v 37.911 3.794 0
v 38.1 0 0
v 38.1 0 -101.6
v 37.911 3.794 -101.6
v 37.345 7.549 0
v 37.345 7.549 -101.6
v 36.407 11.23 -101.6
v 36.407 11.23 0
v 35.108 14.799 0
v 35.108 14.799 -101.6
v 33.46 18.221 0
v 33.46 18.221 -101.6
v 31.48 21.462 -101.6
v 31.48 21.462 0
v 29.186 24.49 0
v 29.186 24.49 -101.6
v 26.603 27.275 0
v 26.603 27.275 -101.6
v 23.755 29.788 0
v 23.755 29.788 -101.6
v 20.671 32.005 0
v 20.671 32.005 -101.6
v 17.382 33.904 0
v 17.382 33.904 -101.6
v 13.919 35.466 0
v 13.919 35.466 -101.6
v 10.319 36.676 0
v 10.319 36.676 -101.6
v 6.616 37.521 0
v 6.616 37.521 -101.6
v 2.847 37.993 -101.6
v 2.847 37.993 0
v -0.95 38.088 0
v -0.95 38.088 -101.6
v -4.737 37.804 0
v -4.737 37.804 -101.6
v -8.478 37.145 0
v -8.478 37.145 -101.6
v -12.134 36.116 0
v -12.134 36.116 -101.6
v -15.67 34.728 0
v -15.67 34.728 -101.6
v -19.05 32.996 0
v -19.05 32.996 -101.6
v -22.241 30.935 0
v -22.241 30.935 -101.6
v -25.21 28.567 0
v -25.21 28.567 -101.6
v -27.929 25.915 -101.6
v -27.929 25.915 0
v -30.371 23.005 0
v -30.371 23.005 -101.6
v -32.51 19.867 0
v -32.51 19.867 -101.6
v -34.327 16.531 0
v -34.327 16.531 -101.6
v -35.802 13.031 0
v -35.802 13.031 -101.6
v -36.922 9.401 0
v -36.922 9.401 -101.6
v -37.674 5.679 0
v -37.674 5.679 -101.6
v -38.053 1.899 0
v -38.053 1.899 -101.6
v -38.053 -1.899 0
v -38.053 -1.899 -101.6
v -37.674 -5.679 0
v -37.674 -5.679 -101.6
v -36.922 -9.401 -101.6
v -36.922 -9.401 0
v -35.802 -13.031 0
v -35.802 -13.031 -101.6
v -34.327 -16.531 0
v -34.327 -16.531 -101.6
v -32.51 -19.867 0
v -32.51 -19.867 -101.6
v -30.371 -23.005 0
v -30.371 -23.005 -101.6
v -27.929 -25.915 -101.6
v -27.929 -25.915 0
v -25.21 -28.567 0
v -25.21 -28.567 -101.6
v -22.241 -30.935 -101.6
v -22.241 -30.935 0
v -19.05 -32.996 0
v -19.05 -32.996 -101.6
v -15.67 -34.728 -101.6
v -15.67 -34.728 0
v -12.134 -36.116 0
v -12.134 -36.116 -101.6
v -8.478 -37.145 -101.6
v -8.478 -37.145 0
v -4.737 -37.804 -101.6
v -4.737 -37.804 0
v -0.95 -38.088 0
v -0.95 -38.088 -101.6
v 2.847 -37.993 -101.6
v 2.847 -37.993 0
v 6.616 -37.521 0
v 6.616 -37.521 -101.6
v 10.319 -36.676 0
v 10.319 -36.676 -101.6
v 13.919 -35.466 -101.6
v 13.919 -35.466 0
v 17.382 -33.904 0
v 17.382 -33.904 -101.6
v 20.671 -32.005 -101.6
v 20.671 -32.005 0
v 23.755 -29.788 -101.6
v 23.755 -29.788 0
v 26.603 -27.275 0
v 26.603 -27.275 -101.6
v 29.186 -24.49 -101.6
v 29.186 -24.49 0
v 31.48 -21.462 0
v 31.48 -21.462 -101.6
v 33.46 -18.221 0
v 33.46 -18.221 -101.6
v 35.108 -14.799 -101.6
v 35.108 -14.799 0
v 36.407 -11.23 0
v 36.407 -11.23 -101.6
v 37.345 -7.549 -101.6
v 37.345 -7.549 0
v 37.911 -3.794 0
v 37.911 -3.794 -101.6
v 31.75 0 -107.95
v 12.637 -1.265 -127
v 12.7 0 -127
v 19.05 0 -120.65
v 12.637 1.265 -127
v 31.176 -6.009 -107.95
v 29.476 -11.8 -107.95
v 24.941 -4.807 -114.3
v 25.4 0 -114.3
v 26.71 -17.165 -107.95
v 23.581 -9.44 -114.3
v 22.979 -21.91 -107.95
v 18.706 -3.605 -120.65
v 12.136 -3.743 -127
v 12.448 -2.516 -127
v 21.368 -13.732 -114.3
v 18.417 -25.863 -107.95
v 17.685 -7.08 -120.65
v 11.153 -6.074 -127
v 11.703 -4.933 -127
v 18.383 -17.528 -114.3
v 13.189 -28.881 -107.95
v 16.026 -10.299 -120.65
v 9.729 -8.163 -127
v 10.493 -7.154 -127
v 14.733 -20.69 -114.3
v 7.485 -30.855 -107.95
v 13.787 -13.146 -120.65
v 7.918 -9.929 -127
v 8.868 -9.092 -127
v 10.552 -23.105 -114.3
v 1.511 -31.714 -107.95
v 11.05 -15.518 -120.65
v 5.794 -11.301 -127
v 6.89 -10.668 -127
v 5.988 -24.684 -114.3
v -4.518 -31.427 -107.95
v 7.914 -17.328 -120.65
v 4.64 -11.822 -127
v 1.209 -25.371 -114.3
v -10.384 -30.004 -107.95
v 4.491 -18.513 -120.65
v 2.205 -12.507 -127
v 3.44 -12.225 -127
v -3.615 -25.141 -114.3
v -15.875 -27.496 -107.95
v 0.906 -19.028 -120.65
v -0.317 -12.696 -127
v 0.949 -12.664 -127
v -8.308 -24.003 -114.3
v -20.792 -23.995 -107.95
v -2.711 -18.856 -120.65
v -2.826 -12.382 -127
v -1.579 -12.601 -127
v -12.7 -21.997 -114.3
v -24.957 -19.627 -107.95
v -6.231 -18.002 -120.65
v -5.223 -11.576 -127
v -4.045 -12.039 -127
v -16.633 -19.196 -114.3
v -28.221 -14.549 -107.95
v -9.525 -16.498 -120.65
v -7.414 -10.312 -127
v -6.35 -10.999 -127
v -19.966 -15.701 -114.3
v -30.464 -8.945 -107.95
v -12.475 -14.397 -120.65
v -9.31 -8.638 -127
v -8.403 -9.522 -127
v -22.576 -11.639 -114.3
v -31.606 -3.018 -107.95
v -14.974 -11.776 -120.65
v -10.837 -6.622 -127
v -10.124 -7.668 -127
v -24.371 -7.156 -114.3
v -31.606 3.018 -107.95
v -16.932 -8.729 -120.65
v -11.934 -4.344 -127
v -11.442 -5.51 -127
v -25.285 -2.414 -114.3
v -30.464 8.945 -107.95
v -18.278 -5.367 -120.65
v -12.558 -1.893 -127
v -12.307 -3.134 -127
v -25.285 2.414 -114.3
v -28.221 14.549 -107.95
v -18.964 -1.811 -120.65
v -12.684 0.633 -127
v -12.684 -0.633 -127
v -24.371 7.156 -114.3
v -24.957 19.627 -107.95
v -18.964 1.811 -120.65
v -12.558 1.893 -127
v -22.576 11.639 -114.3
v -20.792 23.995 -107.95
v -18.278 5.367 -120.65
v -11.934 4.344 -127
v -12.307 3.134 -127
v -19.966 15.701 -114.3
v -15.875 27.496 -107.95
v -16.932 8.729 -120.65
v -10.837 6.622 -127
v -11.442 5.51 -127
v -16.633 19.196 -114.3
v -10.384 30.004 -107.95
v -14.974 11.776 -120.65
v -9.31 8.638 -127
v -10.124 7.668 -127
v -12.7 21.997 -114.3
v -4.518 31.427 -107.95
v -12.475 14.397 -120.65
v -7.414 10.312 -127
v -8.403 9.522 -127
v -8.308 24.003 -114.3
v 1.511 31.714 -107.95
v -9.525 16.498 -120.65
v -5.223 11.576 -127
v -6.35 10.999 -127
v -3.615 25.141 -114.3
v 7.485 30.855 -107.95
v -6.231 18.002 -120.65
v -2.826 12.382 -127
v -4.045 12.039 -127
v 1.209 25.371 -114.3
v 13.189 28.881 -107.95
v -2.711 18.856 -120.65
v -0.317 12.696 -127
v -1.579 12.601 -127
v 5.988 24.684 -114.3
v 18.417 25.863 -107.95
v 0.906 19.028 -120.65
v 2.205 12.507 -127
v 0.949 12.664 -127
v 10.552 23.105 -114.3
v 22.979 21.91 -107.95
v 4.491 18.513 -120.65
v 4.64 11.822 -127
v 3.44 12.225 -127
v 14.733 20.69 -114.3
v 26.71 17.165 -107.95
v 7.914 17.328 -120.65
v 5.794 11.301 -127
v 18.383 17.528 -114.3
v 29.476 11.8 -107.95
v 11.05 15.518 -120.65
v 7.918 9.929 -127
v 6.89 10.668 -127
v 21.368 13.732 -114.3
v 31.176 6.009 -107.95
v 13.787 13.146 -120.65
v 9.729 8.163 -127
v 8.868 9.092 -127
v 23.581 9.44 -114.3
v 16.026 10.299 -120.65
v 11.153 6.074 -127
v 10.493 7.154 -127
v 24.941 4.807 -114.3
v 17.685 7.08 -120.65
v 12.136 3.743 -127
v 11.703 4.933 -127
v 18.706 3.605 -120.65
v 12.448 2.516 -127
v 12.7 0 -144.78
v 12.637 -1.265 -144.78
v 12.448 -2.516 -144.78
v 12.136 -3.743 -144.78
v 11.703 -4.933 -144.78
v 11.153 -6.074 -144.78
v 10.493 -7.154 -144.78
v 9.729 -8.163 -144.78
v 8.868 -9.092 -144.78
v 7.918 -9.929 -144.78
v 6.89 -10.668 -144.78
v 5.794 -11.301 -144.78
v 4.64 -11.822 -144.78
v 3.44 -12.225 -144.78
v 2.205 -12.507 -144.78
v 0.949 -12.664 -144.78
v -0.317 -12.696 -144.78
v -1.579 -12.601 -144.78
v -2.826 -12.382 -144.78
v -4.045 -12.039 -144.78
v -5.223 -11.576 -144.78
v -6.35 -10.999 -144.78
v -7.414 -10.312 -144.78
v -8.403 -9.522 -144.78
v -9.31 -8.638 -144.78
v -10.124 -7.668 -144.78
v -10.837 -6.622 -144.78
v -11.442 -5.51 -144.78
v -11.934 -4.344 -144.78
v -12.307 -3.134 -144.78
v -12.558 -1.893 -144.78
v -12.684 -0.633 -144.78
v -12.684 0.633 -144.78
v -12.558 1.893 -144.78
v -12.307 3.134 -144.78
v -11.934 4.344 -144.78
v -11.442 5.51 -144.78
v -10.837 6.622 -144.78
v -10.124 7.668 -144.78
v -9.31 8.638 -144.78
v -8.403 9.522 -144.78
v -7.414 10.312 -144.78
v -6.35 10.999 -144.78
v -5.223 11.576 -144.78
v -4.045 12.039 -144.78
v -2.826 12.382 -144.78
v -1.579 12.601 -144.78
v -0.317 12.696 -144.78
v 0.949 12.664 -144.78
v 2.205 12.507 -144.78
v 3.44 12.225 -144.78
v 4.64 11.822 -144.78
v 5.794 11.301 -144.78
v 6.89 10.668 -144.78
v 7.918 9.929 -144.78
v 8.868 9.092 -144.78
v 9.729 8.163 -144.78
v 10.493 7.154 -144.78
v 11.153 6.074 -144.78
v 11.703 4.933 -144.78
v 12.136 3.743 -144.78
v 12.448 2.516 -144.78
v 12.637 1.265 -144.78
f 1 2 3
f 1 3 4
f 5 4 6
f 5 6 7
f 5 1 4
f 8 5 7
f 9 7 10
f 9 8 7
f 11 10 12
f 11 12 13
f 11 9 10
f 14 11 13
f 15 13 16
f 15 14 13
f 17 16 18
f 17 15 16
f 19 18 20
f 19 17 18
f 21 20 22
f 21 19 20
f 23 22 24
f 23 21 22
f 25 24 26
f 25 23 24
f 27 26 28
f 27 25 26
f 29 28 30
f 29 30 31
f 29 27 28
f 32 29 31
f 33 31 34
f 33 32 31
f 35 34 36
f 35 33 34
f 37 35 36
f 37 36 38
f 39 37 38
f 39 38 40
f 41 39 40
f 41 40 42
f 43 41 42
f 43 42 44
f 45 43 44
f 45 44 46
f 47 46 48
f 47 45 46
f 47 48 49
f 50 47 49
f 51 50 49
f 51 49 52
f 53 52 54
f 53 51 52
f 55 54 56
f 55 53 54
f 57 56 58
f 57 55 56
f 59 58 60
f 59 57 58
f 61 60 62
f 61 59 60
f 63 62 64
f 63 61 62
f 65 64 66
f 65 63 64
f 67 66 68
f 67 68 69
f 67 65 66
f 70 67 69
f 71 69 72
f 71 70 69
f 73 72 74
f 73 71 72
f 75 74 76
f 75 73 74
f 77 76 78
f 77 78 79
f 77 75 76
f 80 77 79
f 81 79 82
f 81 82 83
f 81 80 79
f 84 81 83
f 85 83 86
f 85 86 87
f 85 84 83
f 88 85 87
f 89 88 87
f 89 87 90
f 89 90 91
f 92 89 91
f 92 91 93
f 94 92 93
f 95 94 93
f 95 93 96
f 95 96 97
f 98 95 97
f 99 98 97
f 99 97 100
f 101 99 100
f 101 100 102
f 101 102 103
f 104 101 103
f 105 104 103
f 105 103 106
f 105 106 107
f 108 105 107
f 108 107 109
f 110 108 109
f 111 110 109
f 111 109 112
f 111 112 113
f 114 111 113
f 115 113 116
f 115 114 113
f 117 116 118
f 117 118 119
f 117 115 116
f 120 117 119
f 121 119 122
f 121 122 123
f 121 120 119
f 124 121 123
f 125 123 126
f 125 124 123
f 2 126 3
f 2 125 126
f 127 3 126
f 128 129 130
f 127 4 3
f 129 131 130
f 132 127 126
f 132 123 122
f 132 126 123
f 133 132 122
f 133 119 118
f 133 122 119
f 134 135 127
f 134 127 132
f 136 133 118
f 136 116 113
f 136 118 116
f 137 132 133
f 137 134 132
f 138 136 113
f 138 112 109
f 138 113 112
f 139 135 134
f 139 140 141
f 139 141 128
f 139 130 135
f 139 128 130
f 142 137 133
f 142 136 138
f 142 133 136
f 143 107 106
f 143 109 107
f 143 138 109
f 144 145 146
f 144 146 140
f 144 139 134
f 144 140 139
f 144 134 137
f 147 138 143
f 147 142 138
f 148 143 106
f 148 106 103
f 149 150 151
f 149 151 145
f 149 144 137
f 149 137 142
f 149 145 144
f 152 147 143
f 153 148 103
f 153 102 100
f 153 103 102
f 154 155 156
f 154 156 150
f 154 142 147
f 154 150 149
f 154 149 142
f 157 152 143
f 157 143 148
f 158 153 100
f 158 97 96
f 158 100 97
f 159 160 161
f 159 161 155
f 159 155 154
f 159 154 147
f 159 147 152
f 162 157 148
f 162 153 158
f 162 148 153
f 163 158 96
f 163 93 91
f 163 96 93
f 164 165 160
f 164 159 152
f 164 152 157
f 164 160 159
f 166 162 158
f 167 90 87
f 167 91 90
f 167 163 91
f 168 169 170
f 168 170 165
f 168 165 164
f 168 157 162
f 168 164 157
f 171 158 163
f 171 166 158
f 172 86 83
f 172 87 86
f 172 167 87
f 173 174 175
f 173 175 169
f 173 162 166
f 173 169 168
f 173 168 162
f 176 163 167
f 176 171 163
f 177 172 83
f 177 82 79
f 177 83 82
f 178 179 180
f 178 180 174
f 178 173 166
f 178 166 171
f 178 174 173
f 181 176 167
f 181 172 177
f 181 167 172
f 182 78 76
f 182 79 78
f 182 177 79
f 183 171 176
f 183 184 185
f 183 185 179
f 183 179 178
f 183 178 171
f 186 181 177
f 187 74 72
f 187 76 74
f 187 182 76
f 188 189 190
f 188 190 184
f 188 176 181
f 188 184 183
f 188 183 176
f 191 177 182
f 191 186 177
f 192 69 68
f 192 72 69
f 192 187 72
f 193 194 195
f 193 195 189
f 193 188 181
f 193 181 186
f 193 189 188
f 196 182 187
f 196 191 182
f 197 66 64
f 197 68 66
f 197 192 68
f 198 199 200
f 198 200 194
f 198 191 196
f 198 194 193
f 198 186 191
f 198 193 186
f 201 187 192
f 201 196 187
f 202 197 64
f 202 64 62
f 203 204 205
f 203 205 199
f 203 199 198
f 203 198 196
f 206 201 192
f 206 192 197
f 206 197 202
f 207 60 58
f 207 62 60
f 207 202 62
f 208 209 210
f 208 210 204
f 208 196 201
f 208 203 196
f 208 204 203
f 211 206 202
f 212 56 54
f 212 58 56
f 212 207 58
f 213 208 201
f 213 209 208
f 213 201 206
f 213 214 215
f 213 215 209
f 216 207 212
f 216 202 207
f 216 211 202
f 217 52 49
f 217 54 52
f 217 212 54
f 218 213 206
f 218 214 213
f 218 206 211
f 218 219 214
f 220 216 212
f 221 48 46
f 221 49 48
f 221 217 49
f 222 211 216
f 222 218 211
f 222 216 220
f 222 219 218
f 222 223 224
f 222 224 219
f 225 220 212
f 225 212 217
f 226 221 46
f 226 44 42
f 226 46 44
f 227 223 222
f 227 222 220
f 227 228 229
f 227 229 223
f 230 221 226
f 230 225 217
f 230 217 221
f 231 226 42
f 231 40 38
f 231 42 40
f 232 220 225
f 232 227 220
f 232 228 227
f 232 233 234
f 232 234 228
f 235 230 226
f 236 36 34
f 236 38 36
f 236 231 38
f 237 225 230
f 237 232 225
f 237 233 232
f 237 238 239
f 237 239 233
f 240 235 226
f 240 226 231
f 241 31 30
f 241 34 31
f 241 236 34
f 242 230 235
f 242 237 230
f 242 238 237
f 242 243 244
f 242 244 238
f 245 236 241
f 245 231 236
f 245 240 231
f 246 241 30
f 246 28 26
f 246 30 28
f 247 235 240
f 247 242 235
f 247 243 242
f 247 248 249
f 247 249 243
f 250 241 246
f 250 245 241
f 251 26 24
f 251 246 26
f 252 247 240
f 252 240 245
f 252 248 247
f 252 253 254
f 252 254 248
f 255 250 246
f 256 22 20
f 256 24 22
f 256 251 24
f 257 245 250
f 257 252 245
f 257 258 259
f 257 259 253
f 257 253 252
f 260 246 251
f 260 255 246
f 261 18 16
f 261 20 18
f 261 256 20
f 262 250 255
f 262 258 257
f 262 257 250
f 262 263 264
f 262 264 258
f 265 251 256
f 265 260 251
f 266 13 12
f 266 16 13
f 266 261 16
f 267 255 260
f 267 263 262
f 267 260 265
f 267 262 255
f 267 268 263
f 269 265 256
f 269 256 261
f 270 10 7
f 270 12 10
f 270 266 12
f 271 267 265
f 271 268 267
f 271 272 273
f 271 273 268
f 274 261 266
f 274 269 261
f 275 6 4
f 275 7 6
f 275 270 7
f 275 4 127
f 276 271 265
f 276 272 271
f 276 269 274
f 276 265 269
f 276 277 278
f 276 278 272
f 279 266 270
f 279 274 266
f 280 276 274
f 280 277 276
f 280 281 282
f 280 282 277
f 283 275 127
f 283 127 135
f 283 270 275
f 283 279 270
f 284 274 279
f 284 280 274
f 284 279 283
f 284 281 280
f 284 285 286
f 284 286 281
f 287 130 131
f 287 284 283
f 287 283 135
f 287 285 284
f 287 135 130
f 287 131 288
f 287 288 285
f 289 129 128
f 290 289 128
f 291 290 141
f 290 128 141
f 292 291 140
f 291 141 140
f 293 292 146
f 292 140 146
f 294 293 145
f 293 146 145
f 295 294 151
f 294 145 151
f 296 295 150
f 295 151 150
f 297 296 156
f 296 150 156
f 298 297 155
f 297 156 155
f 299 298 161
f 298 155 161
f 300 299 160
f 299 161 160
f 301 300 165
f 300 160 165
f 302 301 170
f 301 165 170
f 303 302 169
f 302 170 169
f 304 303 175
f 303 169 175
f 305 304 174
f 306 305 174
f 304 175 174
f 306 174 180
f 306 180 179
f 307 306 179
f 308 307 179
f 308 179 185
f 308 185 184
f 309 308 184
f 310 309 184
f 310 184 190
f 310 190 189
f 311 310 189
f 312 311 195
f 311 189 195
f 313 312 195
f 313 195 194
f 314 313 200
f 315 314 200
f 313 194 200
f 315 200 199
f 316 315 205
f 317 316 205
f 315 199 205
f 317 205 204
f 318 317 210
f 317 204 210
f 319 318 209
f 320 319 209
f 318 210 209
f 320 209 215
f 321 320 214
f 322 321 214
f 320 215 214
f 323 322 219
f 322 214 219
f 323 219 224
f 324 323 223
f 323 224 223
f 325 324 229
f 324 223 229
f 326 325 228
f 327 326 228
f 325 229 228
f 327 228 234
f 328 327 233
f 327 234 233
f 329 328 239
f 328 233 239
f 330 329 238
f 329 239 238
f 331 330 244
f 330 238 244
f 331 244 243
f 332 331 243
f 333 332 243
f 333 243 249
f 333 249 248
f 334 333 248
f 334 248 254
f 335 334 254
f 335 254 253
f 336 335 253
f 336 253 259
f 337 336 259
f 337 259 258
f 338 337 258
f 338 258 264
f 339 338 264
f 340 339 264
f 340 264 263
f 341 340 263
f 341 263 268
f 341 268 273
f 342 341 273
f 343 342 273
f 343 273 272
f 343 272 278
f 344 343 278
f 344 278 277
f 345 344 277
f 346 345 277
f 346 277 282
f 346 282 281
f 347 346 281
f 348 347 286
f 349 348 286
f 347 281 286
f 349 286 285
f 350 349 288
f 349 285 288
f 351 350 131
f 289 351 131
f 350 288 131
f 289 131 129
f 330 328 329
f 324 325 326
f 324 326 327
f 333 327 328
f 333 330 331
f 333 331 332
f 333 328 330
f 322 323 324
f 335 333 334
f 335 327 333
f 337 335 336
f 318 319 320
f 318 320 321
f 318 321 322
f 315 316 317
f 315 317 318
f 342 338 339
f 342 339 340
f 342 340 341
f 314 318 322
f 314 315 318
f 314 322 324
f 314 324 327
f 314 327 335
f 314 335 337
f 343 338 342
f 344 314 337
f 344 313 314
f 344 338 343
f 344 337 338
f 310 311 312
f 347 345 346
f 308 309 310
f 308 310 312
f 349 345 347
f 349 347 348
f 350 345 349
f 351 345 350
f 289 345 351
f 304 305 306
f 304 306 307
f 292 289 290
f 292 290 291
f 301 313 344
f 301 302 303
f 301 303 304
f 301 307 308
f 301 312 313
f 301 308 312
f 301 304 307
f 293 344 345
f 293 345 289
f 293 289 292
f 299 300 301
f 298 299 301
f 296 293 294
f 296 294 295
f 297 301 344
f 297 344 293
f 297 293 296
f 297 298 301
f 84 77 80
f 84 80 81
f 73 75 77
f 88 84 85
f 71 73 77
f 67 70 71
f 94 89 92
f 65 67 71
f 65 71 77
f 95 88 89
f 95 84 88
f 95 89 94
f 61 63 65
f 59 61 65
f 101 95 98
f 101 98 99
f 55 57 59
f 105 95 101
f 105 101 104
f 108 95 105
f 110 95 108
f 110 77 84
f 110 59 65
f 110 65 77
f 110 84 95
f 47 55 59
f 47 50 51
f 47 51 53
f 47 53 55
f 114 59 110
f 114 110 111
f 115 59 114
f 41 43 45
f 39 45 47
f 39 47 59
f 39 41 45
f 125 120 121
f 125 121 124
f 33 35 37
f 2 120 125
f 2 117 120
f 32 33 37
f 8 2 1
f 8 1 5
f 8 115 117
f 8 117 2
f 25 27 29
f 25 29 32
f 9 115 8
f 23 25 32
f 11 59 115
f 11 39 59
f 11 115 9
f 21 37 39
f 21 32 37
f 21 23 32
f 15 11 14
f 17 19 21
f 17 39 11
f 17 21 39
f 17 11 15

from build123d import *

# Parameters (mm, degrees)
F0_R     = 38.1
F1_DEPTH = 101.6
F2_R     = 38.1
F3_DEPTH = 25.4
F3_TAPER = 45
F4_R     = 12.7
F5_DEPTH = 17.78


with BuildPart() as f1:
    # F0 (on Top) → F1 (new body)
    with BuildSketch(Plane.XY):
        Circle(F0_R)
    extrude(amount=-F1_DEPTH)

    # F2 (on face) → F3 (join)
    with BuildSketch(Plane(origin=(0, 0, -101.6), x_dir=(1, 0, 0), z_dir=(0, 0, -1))):
        Circle(F2_R)
    extrude(amount=F3_DEPTH, taper=F3_TAPER)

    # F4 (on face) → F5 (join)
    with BuildSketch(Plane(origin=(0, 0, -127), x_dir=(1, 0, 0), z_dir=(0, 0, -1))):
        Circle(F4_R)
    extrude(amount=F5_DEPTH)


solid = f1.part
